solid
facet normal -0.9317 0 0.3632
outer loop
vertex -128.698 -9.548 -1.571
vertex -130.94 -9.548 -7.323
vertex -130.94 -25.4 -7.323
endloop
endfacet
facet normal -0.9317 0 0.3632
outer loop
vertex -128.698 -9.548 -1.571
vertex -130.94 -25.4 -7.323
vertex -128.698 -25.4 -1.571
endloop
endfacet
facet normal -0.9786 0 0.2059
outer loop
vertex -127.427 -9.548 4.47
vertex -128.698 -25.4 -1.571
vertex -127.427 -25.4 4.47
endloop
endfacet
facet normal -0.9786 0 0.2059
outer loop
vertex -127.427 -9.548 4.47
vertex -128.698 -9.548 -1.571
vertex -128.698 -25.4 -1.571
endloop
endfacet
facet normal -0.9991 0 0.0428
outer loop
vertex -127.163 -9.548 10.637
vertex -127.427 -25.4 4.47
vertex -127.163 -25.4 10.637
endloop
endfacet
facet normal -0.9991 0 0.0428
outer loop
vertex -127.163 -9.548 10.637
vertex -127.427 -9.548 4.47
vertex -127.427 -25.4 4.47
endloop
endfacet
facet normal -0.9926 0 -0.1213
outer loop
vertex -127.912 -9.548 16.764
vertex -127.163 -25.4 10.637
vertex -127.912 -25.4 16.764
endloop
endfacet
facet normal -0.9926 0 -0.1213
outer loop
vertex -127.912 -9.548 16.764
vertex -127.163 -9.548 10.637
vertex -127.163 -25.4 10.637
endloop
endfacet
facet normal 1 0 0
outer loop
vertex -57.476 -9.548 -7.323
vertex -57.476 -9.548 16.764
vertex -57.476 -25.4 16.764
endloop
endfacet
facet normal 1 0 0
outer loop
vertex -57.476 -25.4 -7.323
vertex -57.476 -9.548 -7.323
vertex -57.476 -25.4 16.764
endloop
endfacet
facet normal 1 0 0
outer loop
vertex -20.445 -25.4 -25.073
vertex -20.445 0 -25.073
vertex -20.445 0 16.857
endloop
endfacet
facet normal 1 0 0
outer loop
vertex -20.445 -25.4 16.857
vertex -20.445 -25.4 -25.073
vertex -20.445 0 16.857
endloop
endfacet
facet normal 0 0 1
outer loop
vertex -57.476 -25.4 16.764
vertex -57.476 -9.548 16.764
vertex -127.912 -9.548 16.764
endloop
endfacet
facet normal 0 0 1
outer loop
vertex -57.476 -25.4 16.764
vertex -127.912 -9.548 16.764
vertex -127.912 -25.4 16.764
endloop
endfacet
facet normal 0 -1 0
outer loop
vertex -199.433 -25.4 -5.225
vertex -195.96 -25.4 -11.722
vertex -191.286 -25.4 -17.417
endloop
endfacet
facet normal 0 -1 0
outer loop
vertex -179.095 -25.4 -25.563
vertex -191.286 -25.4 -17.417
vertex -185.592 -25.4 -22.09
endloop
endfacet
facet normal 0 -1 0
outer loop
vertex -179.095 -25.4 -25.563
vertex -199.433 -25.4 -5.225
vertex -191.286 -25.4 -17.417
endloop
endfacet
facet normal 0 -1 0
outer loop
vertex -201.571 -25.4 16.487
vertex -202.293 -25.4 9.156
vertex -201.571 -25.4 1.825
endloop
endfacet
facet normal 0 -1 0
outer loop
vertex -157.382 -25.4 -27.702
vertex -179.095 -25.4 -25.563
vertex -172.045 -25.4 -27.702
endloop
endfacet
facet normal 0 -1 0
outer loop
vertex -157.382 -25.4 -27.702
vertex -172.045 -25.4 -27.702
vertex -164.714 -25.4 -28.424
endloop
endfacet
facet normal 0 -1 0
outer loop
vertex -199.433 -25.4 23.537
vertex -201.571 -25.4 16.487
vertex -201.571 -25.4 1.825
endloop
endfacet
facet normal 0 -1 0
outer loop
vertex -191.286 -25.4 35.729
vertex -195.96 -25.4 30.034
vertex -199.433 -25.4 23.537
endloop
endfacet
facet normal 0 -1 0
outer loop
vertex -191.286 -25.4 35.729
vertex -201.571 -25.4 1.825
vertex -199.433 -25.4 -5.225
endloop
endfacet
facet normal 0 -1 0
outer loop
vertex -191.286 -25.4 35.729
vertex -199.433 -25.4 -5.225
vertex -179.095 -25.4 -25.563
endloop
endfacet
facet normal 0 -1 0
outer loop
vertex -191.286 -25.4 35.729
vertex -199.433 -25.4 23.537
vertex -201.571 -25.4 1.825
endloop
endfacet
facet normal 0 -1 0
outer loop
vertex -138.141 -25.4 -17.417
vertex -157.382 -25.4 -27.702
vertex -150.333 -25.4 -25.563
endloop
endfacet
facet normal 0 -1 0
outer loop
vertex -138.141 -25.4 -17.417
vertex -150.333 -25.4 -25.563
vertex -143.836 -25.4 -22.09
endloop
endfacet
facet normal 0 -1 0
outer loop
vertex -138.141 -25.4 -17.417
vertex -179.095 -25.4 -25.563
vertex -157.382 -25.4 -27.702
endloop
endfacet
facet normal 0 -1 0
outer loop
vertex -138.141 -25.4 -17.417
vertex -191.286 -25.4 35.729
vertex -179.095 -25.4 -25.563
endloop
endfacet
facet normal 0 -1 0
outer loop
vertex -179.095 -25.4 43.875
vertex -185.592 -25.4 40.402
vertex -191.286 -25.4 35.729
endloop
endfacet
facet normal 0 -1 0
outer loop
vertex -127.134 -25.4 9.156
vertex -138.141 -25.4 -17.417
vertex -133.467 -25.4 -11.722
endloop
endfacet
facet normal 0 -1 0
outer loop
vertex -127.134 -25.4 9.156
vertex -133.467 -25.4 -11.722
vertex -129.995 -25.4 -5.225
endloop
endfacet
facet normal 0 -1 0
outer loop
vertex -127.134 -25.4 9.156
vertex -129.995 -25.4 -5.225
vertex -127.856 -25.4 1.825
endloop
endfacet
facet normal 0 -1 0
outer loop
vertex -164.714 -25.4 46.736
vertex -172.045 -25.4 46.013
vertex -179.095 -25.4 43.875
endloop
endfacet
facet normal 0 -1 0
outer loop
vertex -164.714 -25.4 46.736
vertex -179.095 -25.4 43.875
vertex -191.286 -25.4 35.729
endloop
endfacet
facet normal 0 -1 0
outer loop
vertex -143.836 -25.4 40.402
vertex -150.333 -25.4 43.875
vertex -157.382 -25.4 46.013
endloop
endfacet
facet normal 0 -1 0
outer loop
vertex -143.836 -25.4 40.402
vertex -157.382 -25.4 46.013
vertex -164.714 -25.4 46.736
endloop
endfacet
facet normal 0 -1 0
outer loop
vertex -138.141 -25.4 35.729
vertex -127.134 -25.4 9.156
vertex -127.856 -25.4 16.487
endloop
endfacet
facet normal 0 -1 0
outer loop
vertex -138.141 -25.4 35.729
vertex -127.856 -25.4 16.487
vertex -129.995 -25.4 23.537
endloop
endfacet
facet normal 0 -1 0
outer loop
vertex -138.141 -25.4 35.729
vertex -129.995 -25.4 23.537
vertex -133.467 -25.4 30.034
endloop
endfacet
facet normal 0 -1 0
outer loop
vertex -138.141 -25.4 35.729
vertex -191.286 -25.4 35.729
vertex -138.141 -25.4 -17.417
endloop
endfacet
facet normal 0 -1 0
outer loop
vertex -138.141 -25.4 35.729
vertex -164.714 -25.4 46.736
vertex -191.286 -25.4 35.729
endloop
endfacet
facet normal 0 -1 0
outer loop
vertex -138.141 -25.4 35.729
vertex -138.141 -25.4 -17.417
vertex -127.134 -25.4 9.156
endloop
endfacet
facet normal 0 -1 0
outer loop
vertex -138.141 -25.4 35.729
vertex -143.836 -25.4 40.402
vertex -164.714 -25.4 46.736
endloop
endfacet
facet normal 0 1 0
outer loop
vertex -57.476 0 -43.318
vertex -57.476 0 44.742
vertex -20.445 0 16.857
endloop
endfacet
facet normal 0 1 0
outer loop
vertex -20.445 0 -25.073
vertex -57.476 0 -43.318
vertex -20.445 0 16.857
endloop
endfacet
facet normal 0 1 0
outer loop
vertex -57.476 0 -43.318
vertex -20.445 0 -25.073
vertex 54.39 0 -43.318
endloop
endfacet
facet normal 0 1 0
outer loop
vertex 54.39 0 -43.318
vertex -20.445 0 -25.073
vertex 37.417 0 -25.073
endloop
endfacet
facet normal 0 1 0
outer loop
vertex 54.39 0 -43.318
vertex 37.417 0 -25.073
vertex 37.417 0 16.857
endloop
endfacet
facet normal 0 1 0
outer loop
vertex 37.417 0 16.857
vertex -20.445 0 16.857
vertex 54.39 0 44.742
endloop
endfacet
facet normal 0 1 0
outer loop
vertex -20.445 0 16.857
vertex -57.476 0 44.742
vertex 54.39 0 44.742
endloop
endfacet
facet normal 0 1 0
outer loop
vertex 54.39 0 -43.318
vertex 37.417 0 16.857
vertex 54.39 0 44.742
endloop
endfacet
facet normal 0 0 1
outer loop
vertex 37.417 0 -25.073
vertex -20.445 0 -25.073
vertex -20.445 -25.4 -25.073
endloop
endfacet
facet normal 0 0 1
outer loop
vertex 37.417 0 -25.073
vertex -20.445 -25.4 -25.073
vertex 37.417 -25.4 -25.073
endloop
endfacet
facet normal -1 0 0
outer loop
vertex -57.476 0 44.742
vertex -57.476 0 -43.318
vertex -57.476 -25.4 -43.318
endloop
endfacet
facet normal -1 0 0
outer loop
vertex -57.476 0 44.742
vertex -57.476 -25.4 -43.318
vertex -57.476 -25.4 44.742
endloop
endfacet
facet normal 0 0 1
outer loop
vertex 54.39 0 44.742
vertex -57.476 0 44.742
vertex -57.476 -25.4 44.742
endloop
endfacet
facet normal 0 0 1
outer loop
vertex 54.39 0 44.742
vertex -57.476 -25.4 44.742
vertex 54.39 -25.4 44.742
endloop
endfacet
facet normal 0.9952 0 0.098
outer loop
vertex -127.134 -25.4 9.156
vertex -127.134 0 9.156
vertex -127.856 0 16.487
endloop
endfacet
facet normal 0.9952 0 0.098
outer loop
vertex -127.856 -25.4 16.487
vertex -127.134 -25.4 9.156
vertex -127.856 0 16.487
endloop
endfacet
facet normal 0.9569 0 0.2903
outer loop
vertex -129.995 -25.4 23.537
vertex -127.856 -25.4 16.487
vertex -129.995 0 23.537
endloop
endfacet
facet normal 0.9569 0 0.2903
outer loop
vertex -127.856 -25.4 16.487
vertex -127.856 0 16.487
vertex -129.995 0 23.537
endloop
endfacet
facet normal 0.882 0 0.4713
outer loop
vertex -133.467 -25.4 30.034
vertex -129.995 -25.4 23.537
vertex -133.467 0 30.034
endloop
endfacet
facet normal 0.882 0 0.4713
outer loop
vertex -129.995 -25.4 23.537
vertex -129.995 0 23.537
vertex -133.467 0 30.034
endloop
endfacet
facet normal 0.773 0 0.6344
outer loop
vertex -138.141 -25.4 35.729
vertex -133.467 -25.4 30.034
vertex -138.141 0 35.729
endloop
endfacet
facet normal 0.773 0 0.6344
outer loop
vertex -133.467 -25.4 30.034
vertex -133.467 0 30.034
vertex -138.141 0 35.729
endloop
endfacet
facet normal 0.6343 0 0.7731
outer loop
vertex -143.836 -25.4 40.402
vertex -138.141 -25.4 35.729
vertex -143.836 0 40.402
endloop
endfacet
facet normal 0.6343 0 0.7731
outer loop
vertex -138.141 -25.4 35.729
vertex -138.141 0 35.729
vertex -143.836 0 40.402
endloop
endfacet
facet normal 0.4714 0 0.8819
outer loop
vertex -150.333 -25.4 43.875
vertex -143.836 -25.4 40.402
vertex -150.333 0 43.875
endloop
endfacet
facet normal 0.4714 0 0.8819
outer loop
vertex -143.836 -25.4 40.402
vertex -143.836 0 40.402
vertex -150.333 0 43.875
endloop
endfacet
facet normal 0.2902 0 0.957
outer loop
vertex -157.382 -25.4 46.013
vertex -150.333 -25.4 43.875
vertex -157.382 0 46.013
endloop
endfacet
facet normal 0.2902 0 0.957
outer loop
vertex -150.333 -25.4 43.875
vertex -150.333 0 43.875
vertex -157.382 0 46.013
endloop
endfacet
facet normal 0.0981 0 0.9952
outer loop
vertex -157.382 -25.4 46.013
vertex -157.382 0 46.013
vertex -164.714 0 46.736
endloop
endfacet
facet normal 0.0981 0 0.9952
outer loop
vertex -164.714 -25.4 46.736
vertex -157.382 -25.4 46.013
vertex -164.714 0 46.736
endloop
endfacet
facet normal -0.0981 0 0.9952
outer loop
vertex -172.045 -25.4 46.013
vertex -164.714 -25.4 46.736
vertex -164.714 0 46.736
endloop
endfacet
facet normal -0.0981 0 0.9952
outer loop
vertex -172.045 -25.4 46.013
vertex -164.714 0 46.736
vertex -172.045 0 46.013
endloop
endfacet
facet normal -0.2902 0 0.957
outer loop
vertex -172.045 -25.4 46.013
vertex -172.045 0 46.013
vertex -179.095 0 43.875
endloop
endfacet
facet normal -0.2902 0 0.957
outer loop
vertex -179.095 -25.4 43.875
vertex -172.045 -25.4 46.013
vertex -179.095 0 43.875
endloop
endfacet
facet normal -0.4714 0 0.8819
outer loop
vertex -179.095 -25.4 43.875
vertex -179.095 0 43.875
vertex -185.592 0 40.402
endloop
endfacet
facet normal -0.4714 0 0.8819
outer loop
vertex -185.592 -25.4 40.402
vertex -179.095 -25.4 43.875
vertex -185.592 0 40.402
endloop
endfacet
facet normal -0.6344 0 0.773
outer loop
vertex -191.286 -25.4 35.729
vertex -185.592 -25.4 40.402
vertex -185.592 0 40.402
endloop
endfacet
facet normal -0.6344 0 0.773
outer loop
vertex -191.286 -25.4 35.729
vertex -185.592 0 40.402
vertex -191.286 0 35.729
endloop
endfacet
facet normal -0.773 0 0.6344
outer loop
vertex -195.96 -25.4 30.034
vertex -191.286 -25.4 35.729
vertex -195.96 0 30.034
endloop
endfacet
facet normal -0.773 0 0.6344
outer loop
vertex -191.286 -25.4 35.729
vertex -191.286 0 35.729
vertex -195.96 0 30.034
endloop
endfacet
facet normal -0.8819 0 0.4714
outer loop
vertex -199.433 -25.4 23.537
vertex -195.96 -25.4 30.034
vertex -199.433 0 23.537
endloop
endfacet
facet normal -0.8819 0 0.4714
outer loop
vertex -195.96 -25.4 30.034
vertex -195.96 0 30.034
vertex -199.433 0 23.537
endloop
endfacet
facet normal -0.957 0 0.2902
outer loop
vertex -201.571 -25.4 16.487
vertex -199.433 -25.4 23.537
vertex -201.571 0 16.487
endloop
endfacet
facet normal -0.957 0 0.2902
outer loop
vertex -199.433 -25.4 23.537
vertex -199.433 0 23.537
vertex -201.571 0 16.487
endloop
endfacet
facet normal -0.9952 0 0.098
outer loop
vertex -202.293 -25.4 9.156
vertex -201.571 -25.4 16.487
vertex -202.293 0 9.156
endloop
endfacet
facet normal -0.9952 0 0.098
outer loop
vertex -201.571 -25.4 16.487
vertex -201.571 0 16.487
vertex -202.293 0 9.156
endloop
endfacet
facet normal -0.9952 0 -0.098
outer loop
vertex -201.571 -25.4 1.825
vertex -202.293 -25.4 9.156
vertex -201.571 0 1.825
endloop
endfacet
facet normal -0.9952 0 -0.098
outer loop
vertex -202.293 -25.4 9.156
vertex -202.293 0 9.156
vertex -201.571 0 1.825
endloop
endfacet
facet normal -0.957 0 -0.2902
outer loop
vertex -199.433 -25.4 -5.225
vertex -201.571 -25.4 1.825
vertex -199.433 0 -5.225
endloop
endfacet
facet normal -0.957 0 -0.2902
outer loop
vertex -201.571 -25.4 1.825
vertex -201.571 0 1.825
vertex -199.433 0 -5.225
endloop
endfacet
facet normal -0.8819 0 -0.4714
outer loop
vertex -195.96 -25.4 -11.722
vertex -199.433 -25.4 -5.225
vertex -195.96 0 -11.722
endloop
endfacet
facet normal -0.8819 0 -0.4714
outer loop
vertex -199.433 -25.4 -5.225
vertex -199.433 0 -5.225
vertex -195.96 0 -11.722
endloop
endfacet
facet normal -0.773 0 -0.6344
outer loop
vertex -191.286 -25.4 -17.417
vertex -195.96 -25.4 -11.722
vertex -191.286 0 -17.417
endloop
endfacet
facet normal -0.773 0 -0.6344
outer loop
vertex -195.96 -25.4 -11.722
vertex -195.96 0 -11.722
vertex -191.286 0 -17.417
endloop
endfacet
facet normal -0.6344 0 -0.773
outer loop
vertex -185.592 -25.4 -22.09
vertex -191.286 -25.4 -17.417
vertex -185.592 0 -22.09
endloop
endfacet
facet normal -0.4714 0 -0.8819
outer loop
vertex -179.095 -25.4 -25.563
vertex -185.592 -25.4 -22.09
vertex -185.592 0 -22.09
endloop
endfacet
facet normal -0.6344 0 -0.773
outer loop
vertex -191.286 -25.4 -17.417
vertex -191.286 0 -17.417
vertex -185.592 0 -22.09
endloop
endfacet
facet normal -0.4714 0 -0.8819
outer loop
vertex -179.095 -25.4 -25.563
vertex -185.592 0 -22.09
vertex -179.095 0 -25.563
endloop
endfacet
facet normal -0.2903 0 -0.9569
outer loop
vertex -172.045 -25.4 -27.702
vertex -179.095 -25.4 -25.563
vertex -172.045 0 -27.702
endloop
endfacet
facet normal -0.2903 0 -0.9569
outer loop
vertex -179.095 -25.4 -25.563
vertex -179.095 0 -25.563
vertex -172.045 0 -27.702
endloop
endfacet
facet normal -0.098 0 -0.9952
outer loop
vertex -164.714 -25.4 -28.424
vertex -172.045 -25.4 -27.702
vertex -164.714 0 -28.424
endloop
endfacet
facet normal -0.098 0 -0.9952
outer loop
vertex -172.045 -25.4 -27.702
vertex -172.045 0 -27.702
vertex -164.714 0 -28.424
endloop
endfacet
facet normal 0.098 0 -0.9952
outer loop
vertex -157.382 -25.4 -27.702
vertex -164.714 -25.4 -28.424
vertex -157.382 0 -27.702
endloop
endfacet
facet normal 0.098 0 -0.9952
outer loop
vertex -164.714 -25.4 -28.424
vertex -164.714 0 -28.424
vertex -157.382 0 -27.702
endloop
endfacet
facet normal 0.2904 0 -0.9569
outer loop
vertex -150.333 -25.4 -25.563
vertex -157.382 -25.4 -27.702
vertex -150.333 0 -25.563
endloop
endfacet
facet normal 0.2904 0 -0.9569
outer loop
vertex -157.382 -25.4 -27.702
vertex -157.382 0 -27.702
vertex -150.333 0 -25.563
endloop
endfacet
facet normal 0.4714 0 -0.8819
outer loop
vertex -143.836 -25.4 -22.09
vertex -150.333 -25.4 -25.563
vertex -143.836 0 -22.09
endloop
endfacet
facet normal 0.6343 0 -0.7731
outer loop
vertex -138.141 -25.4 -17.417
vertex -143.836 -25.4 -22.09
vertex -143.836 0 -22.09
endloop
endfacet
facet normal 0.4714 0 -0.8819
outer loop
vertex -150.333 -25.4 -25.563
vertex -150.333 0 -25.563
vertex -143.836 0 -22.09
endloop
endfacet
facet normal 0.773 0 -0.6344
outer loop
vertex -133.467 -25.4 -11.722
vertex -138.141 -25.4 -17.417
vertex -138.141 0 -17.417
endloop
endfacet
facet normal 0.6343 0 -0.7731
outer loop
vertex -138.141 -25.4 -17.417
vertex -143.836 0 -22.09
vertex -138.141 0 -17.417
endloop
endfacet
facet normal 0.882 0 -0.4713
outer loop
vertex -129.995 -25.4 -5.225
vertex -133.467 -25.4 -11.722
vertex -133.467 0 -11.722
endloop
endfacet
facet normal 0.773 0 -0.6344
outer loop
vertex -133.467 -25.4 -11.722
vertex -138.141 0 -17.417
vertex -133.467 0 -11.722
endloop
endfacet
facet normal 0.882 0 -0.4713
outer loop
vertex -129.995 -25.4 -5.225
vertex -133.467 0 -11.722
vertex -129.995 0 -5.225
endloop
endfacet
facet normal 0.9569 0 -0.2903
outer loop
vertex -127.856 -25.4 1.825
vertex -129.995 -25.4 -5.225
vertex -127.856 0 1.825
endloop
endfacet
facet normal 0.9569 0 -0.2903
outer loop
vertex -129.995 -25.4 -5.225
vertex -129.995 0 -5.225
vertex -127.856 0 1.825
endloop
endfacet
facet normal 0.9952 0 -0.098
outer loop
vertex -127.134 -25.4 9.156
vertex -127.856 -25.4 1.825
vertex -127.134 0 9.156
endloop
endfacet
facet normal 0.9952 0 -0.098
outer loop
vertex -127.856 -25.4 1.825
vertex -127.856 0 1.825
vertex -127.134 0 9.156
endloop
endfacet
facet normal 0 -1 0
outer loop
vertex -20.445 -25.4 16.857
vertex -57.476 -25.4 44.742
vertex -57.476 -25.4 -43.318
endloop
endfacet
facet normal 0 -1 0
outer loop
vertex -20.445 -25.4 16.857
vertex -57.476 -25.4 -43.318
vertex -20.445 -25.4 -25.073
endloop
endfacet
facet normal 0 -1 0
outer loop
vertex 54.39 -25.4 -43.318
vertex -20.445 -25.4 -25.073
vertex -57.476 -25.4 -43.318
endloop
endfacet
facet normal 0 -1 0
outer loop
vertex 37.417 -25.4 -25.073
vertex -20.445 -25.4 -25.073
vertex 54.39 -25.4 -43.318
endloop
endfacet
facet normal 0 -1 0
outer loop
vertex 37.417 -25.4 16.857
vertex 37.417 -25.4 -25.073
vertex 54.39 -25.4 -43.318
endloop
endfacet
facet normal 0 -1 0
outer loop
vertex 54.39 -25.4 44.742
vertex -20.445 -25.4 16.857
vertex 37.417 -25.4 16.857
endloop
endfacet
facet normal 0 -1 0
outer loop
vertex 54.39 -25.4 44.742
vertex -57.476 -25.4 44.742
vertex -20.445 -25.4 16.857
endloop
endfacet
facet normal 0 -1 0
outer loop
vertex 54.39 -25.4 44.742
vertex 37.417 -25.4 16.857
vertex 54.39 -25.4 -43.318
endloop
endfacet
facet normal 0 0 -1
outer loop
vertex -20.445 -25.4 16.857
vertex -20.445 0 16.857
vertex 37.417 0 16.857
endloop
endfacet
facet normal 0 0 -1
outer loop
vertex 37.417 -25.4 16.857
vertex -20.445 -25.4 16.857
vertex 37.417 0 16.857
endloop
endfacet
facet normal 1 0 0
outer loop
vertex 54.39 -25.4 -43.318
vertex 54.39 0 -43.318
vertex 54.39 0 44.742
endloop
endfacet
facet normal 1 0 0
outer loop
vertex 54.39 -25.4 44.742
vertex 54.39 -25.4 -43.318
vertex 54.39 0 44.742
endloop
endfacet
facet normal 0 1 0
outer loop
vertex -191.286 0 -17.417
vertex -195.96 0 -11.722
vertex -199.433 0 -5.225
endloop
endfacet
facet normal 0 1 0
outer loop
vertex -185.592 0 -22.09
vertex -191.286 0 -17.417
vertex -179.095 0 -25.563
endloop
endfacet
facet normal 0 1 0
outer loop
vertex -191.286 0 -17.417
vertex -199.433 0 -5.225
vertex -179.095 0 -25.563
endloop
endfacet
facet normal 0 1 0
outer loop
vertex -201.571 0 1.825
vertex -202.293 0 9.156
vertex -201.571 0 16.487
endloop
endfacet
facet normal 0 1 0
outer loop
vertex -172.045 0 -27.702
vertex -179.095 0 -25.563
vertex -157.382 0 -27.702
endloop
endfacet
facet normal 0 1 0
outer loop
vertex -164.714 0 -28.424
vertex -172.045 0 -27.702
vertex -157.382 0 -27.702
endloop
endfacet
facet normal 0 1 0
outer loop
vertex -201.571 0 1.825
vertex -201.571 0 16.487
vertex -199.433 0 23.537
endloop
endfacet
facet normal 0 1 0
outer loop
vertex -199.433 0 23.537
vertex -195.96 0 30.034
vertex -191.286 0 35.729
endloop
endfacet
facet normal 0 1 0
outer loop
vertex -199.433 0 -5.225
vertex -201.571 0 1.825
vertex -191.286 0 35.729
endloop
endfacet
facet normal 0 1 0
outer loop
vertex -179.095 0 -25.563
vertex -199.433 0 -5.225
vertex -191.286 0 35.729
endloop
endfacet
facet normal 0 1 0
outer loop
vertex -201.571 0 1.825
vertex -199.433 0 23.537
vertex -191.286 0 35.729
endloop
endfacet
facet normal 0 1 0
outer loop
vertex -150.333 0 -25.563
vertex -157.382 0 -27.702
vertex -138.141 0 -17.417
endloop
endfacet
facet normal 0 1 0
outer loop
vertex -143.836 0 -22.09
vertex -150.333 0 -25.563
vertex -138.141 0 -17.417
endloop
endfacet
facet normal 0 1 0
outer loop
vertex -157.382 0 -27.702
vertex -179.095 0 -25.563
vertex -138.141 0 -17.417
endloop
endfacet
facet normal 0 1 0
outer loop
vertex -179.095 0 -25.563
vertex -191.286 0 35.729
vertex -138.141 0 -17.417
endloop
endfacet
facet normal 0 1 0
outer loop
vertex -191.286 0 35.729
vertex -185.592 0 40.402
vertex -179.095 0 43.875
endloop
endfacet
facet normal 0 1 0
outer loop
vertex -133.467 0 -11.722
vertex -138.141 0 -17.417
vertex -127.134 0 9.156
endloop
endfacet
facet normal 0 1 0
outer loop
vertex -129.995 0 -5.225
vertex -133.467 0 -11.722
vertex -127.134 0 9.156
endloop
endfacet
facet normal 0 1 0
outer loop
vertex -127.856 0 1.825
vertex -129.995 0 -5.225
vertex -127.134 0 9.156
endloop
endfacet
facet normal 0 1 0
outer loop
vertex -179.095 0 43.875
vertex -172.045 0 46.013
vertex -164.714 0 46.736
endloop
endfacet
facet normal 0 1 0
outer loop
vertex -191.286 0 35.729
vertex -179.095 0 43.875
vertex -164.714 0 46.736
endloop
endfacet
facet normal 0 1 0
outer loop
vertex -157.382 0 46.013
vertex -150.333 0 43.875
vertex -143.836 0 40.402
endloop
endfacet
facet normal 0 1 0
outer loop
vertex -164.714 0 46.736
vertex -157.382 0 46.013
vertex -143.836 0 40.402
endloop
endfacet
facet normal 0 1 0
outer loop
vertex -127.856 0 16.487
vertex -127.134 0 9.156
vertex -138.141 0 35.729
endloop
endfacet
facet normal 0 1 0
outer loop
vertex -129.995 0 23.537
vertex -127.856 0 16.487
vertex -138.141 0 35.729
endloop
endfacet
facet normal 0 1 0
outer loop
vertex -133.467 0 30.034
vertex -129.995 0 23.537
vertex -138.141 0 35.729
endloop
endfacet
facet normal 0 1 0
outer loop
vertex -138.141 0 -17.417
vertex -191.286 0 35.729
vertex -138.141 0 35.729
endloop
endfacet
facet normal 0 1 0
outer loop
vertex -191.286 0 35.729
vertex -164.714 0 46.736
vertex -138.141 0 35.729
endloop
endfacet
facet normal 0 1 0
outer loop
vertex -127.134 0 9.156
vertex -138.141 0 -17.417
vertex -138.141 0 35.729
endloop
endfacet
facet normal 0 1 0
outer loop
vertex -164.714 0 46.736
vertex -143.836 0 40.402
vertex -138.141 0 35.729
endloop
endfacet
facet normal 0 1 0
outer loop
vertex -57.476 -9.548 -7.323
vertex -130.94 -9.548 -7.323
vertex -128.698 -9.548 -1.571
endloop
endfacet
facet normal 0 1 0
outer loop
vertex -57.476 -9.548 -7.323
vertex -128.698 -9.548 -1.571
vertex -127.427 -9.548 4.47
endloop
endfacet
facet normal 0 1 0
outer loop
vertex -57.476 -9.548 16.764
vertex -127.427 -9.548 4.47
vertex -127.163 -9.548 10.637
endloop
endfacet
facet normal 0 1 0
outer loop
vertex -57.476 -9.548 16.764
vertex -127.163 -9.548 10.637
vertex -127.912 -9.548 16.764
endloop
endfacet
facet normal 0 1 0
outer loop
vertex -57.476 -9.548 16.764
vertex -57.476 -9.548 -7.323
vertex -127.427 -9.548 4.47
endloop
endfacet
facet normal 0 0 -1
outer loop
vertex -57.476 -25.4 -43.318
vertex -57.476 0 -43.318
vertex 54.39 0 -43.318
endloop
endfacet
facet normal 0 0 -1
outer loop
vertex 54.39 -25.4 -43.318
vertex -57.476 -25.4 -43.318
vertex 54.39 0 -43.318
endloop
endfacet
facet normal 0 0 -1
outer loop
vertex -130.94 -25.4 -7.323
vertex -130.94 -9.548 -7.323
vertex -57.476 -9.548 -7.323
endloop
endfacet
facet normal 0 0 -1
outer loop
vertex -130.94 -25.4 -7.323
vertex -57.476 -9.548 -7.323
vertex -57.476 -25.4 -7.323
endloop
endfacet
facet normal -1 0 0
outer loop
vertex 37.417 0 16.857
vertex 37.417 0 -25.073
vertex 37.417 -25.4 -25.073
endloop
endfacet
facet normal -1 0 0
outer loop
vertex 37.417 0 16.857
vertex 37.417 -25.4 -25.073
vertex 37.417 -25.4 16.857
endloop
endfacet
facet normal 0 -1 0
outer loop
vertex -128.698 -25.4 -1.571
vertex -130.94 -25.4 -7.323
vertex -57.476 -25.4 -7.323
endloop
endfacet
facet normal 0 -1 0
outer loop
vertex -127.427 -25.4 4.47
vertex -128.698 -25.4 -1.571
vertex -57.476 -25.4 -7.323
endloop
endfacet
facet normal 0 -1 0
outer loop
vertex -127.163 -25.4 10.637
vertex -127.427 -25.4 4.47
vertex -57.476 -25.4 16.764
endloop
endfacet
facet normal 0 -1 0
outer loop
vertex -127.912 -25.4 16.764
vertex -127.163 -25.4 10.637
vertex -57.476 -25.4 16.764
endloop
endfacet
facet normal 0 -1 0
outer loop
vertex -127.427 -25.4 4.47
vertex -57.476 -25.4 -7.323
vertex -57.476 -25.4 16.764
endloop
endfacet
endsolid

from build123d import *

# Parameters (mm, degrees)
F0_W     = 111.8664443493
F0_H     = 88.0598053336
F0_W_2   = 57.8619539738
F0_H_2   = 41.9301427901
F0_R     = 37.5795761557
F1_DEPTH = 25.4
F2_W     = 15.8524134472
F2_H     = 24.0868339315


with BuildPart() as f1:
    # F0 (on Front) → F1 (new body)
    with BuildSketch(Plane.XZ):
        with Locations((-1.542981714, 0.7118172944)):
            Rectangle(F0_W, F0_H)
        with Locations((8.4864236414, -4.1078682989)):
            Rectangle(F0_W_2, F0_H_2, mode=Mode.SUBTRACT)
        with Locations((-164.7136956453, 9.1559626162)):
            Circle(F0_R)
    extrude(amount=F1_DEPTH)


with BuildPart() as f3:
    # F2 (on face) → F3 (new body, up to the next surface of F1)
    with BuildSketch(Plane(origin=(-57.4762038887, 0, 0), x_dir=(0, -1, 0), z_dir=(-1, 0, 0))):
        with Locations((17.4737932764, 4.7207414173)):
            Rectangle(F2_W, F2_H)
    extrude(until=Until.NEXT, target=f1.part)


solid = Compound([f1.part, f3.part])
